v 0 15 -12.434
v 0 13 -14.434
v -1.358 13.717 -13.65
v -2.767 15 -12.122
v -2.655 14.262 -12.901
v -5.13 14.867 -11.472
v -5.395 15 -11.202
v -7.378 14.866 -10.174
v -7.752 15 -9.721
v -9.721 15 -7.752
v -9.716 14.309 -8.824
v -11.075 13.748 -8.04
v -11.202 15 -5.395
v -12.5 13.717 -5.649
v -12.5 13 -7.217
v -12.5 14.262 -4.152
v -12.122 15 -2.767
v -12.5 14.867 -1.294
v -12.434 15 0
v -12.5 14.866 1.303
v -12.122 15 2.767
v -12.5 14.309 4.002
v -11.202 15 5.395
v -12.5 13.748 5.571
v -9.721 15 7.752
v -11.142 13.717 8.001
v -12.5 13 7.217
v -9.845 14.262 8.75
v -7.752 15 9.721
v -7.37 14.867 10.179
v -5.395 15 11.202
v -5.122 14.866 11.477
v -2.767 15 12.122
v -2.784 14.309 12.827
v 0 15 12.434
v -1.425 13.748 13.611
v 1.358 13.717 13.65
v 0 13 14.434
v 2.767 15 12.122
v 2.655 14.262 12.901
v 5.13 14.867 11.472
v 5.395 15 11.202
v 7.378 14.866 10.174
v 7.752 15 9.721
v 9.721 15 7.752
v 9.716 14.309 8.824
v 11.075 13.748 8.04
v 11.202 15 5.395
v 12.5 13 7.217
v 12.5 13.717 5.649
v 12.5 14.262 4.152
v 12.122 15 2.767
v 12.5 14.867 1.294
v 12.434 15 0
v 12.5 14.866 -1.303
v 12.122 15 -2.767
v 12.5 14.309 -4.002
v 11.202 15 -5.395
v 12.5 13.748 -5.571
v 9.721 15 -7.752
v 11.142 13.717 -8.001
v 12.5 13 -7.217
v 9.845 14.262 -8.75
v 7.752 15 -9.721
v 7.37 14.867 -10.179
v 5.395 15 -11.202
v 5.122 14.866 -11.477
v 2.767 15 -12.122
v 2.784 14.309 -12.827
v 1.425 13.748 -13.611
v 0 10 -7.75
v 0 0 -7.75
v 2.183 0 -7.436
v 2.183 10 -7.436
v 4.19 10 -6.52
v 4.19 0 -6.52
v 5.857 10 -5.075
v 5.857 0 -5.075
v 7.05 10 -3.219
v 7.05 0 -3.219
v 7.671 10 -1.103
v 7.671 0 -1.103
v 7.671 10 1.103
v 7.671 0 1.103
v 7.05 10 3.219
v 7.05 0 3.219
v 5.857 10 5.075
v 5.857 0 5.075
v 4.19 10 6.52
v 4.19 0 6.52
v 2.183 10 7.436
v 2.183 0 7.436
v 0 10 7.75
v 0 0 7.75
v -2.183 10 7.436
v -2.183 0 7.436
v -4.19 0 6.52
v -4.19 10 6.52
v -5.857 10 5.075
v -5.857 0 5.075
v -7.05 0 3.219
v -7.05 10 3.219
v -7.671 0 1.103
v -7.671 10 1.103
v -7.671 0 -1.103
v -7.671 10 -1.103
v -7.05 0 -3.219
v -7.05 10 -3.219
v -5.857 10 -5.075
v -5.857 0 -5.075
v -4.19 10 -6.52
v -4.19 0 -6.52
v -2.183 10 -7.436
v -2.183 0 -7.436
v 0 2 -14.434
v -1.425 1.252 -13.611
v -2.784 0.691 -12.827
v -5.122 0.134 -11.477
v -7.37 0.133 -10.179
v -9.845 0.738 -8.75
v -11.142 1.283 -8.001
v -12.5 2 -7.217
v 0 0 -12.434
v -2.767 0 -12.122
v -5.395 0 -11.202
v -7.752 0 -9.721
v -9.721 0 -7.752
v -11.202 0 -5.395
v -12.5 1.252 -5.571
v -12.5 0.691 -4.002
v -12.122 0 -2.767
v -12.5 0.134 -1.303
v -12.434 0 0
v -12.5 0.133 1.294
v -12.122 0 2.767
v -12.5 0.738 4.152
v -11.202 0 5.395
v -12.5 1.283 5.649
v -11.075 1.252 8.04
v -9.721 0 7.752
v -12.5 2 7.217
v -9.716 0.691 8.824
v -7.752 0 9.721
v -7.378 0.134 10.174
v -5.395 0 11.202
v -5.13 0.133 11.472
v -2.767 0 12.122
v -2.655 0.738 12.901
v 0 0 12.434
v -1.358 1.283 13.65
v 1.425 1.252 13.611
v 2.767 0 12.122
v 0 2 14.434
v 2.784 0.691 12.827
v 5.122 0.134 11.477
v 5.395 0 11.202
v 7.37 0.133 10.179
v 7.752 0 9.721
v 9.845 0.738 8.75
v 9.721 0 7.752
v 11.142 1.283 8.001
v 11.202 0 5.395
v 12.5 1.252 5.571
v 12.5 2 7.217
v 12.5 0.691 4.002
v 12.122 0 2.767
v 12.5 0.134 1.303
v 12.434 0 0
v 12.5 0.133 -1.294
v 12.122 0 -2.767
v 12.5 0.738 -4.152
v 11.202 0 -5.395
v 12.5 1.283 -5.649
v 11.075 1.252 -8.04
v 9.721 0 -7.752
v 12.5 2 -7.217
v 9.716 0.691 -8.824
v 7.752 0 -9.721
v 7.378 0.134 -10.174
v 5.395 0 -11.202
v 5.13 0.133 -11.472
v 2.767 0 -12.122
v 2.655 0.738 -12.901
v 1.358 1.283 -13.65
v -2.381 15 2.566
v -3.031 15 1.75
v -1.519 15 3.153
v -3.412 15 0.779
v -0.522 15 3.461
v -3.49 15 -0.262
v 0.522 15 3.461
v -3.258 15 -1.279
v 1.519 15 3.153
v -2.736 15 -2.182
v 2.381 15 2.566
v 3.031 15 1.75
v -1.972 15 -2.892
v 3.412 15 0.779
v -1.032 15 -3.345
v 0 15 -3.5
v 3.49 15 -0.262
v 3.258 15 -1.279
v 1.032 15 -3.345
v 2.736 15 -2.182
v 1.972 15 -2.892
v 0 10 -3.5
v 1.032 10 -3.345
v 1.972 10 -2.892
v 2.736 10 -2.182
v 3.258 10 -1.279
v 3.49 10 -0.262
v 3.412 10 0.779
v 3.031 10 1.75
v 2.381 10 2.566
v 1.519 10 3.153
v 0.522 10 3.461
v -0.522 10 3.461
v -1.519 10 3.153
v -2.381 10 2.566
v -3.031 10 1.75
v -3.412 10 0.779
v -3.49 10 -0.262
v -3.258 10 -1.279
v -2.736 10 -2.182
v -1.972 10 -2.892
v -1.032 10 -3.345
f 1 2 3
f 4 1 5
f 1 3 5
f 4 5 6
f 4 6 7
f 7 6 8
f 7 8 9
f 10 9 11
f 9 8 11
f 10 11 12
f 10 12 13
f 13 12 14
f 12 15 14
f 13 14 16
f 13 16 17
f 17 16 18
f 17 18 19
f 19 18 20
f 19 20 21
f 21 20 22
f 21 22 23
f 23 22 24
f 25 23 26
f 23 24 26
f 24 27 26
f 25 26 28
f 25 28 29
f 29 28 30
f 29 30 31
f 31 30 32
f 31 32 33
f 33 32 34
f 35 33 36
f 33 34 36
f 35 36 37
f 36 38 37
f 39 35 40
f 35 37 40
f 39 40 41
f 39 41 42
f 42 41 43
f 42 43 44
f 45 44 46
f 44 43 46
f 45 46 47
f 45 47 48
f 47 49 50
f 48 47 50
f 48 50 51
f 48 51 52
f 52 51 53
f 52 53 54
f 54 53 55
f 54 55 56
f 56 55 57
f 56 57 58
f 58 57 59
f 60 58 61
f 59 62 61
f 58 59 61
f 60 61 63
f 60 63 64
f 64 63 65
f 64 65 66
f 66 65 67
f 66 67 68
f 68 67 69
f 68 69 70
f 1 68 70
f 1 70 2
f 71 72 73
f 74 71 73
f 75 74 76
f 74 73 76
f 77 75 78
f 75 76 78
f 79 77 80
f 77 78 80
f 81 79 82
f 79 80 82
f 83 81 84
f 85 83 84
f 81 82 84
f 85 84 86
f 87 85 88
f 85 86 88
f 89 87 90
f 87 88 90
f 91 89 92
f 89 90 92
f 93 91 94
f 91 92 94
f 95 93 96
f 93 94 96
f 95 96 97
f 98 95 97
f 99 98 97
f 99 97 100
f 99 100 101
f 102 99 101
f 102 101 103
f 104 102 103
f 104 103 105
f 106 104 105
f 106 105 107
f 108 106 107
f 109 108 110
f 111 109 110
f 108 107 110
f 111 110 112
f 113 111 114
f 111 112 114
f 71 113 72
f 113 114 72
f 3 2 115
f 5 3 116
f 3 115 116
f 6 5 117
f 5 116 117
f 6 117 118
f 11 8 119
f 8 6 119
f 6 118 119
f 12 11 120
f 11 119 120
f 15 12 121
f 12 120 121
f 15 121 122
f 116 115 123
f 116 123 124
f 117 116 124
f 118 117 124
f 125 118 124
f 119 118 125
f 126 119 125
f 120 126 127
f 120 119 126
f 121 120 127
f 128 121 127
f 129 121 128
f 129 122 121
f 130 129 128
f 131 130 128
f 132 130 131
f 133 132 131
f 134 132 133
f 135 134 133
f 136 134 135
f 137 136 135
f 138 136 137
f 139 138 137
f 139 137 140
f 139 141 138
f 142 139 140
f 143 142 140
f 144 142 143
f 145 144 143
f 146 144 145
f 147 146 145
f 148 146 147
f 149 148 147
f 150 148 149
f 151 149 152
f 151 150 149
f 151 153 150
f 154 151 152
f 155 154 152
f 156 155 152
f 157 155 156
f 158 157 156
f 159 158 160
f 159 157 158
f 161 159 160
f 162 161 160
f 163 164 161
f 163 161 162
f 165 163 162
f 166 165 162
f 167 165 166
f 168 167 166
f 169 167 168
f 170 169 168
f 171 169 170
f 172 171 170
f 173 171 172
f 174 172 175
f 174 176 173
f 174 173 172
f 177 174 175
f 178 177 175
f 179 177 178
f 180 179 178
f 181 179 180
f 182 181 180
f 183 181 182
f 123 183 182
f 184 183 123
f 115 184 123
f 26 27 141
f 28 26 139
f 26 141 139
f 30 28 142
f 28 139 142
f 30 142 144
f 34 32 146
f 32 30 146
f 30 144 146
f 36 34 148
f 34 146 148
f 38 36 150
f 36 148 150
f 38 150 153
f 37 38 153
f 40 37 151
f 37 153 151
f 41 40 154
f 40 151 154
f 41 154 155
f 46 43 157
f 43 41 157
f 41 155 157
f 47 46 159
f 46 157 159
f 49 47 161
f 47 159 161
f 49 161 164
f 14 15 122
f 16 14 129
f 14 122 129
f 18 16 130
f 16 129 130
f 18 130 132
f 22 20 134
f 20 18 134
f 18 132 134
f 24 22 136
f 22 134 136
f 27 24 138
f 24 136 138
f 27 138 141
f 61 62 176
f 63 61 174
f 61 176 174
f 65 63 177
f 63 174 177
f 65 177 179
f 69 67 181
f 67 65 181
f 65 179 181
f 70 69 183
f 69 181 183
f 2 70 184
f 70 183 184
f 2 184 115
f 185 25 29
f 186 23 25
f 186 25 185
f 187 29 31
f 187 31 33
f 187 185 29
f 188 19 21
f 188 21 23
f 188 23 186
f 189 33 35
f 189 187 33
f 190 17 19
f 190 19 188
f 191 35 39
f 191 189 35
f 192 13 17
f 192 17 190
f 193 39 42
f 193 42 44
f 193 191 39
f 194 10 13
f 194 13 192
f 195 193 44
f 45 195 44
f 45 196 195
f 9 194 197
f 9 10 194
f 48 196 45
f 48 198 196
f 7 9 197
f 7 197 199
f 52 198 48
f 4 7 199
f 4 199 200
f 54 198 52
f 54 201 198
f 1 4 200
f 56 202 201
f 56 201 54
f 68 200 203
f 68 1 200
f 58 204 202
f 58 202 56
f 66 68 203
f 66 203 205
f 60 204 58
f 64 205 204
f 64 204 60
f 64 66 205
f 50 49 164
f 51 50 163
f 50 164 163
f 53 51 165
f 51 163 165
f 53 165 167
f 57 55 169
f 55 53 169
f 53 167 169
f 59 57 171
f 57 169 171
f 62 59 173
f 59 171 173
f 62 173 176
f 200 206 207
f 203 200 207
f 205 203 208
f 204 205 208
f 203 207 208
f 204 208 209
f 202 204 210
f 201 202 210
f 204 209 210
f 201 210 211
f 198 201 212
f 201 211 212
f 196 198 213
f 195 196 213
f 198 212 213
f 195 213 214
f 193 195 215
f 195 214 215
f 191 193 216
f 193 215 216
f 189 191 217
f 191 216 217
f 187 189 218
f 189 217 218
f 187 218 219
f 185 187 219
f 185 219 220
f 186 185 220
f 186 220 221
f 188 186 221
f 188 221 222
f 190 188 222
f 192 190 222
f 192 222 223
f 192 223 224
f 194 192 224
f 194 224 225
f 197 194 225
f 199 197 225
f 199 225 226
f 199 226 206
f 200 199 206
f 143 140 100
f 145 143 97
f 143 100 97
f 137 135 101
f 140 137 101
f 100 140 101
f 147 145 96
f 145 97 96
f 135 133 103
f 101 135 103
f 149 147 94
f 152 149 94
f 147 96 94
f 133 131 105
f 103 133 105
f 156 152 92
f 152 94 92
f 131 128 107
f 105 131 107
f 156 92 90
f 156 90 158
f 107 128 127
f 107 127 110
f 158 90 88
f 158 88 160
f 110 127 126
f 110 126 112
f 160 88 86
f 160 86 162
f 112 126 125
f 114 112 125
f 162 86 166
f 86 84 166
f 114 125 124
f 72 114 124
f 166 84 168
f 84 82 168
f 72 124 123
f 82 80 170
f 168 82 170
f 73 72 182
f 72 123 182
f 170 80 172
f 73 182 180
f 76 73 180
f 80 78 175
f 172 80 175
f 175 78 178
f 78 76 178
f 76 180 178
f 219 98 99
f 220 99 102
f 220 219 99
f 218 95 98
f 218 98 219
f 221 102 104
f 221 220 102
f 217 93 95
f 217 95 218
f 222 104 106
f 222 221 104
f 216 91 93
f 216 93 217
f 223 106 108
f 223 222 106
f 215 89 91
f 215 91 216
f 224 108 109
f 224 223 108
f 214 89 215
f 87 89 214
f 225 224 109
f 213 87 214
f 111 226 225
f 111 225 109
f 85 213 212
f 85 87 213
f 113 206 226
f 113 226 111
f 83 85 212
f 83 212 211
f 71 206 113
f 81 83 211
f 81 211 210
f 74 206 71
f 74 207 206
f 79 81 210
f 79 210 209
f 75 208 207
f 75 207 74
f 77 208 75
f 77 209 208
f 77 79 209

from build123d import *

# Parameters (mm, degrees)
BOSS_EXTRUDE1_DEPTH = 15
CUT_EXTRUDE2_REACH  = 26.281
SKETCH5_R           = 3.5
SKETCH8_R           = 7.75
CUT_EXTRUDE3_DEPTH  = 10


with BuildPart() as part:
    # Sketch2 → Boss-Extrude1 (new body)
    with BuildSketch(Plane(origin=(0, 0, 0), x_dir=(1, 0, 0), z_dir=(0, 1, 0))):
        Polygon((0, 14.43375673), (-12.5, 7.216878365), (-12.5, -7.216878365), (0, -14.43375673), (12.5, -7.216878365), (12.5, 7.216878365), align=None)
    extrude(amount=BOSS_EXTRUDE1_DEPTH)

    # Sketch3 → Cut-Revolve1 (revolve, cut)
    with BuildSketch(Plane(origin=(0, 0, 0), x_dir=(0, 0, -1), z_dir=(1, 0, 0))):
        Polygon((14.43375673, 15), (12.43375673, 15), (14.43375673, 13), align=None)
    cut_revolve1 = revolve(axis=Axis((0, 0, 0), (0, 1, 0)), mode=Mode.SUBTRACT)

    # Mirror1: Cut-Revolve1 across plane
    add(cut_revolve1.mirror(Plane.ZX.offset(7.5)), mode=Mode.SUBTRACT)

    # Sketch5 → Cut-Extrude2 (cut, up to next)
    with BuildSketch(Plane.XZ, mode=Mode.PRIVATE) as cut_extrude2_sk1:
        with Locations(Location((0, 0, 0), (0, 0, 270))):
            Circle(SKETCH5_R)
    cut_extrude2_tool1 = extrude(cut_extrude2_sk1.sketch, amount=-CUT_EXTRUDE2_REACH, mode=Mode.PRIVATE) & part.part
    add(cut_extrude2_tool1.solids().sort_by_distance((0, 0, 0))[0], mode=Mode.SUBTRACT)

    # Sketch8 → Cut-Extrude3 (cut)
    with BuildSketch(Plane.XZ):
        with Locations(Location((0, 0, 0), (0, 0, 270))):
            Circle(SKETCH8_R)
    extrude(amount=-CUT_EXTRUDE3_DEPTH, mode=Mode.SUBTRACT)


solid = part.part
